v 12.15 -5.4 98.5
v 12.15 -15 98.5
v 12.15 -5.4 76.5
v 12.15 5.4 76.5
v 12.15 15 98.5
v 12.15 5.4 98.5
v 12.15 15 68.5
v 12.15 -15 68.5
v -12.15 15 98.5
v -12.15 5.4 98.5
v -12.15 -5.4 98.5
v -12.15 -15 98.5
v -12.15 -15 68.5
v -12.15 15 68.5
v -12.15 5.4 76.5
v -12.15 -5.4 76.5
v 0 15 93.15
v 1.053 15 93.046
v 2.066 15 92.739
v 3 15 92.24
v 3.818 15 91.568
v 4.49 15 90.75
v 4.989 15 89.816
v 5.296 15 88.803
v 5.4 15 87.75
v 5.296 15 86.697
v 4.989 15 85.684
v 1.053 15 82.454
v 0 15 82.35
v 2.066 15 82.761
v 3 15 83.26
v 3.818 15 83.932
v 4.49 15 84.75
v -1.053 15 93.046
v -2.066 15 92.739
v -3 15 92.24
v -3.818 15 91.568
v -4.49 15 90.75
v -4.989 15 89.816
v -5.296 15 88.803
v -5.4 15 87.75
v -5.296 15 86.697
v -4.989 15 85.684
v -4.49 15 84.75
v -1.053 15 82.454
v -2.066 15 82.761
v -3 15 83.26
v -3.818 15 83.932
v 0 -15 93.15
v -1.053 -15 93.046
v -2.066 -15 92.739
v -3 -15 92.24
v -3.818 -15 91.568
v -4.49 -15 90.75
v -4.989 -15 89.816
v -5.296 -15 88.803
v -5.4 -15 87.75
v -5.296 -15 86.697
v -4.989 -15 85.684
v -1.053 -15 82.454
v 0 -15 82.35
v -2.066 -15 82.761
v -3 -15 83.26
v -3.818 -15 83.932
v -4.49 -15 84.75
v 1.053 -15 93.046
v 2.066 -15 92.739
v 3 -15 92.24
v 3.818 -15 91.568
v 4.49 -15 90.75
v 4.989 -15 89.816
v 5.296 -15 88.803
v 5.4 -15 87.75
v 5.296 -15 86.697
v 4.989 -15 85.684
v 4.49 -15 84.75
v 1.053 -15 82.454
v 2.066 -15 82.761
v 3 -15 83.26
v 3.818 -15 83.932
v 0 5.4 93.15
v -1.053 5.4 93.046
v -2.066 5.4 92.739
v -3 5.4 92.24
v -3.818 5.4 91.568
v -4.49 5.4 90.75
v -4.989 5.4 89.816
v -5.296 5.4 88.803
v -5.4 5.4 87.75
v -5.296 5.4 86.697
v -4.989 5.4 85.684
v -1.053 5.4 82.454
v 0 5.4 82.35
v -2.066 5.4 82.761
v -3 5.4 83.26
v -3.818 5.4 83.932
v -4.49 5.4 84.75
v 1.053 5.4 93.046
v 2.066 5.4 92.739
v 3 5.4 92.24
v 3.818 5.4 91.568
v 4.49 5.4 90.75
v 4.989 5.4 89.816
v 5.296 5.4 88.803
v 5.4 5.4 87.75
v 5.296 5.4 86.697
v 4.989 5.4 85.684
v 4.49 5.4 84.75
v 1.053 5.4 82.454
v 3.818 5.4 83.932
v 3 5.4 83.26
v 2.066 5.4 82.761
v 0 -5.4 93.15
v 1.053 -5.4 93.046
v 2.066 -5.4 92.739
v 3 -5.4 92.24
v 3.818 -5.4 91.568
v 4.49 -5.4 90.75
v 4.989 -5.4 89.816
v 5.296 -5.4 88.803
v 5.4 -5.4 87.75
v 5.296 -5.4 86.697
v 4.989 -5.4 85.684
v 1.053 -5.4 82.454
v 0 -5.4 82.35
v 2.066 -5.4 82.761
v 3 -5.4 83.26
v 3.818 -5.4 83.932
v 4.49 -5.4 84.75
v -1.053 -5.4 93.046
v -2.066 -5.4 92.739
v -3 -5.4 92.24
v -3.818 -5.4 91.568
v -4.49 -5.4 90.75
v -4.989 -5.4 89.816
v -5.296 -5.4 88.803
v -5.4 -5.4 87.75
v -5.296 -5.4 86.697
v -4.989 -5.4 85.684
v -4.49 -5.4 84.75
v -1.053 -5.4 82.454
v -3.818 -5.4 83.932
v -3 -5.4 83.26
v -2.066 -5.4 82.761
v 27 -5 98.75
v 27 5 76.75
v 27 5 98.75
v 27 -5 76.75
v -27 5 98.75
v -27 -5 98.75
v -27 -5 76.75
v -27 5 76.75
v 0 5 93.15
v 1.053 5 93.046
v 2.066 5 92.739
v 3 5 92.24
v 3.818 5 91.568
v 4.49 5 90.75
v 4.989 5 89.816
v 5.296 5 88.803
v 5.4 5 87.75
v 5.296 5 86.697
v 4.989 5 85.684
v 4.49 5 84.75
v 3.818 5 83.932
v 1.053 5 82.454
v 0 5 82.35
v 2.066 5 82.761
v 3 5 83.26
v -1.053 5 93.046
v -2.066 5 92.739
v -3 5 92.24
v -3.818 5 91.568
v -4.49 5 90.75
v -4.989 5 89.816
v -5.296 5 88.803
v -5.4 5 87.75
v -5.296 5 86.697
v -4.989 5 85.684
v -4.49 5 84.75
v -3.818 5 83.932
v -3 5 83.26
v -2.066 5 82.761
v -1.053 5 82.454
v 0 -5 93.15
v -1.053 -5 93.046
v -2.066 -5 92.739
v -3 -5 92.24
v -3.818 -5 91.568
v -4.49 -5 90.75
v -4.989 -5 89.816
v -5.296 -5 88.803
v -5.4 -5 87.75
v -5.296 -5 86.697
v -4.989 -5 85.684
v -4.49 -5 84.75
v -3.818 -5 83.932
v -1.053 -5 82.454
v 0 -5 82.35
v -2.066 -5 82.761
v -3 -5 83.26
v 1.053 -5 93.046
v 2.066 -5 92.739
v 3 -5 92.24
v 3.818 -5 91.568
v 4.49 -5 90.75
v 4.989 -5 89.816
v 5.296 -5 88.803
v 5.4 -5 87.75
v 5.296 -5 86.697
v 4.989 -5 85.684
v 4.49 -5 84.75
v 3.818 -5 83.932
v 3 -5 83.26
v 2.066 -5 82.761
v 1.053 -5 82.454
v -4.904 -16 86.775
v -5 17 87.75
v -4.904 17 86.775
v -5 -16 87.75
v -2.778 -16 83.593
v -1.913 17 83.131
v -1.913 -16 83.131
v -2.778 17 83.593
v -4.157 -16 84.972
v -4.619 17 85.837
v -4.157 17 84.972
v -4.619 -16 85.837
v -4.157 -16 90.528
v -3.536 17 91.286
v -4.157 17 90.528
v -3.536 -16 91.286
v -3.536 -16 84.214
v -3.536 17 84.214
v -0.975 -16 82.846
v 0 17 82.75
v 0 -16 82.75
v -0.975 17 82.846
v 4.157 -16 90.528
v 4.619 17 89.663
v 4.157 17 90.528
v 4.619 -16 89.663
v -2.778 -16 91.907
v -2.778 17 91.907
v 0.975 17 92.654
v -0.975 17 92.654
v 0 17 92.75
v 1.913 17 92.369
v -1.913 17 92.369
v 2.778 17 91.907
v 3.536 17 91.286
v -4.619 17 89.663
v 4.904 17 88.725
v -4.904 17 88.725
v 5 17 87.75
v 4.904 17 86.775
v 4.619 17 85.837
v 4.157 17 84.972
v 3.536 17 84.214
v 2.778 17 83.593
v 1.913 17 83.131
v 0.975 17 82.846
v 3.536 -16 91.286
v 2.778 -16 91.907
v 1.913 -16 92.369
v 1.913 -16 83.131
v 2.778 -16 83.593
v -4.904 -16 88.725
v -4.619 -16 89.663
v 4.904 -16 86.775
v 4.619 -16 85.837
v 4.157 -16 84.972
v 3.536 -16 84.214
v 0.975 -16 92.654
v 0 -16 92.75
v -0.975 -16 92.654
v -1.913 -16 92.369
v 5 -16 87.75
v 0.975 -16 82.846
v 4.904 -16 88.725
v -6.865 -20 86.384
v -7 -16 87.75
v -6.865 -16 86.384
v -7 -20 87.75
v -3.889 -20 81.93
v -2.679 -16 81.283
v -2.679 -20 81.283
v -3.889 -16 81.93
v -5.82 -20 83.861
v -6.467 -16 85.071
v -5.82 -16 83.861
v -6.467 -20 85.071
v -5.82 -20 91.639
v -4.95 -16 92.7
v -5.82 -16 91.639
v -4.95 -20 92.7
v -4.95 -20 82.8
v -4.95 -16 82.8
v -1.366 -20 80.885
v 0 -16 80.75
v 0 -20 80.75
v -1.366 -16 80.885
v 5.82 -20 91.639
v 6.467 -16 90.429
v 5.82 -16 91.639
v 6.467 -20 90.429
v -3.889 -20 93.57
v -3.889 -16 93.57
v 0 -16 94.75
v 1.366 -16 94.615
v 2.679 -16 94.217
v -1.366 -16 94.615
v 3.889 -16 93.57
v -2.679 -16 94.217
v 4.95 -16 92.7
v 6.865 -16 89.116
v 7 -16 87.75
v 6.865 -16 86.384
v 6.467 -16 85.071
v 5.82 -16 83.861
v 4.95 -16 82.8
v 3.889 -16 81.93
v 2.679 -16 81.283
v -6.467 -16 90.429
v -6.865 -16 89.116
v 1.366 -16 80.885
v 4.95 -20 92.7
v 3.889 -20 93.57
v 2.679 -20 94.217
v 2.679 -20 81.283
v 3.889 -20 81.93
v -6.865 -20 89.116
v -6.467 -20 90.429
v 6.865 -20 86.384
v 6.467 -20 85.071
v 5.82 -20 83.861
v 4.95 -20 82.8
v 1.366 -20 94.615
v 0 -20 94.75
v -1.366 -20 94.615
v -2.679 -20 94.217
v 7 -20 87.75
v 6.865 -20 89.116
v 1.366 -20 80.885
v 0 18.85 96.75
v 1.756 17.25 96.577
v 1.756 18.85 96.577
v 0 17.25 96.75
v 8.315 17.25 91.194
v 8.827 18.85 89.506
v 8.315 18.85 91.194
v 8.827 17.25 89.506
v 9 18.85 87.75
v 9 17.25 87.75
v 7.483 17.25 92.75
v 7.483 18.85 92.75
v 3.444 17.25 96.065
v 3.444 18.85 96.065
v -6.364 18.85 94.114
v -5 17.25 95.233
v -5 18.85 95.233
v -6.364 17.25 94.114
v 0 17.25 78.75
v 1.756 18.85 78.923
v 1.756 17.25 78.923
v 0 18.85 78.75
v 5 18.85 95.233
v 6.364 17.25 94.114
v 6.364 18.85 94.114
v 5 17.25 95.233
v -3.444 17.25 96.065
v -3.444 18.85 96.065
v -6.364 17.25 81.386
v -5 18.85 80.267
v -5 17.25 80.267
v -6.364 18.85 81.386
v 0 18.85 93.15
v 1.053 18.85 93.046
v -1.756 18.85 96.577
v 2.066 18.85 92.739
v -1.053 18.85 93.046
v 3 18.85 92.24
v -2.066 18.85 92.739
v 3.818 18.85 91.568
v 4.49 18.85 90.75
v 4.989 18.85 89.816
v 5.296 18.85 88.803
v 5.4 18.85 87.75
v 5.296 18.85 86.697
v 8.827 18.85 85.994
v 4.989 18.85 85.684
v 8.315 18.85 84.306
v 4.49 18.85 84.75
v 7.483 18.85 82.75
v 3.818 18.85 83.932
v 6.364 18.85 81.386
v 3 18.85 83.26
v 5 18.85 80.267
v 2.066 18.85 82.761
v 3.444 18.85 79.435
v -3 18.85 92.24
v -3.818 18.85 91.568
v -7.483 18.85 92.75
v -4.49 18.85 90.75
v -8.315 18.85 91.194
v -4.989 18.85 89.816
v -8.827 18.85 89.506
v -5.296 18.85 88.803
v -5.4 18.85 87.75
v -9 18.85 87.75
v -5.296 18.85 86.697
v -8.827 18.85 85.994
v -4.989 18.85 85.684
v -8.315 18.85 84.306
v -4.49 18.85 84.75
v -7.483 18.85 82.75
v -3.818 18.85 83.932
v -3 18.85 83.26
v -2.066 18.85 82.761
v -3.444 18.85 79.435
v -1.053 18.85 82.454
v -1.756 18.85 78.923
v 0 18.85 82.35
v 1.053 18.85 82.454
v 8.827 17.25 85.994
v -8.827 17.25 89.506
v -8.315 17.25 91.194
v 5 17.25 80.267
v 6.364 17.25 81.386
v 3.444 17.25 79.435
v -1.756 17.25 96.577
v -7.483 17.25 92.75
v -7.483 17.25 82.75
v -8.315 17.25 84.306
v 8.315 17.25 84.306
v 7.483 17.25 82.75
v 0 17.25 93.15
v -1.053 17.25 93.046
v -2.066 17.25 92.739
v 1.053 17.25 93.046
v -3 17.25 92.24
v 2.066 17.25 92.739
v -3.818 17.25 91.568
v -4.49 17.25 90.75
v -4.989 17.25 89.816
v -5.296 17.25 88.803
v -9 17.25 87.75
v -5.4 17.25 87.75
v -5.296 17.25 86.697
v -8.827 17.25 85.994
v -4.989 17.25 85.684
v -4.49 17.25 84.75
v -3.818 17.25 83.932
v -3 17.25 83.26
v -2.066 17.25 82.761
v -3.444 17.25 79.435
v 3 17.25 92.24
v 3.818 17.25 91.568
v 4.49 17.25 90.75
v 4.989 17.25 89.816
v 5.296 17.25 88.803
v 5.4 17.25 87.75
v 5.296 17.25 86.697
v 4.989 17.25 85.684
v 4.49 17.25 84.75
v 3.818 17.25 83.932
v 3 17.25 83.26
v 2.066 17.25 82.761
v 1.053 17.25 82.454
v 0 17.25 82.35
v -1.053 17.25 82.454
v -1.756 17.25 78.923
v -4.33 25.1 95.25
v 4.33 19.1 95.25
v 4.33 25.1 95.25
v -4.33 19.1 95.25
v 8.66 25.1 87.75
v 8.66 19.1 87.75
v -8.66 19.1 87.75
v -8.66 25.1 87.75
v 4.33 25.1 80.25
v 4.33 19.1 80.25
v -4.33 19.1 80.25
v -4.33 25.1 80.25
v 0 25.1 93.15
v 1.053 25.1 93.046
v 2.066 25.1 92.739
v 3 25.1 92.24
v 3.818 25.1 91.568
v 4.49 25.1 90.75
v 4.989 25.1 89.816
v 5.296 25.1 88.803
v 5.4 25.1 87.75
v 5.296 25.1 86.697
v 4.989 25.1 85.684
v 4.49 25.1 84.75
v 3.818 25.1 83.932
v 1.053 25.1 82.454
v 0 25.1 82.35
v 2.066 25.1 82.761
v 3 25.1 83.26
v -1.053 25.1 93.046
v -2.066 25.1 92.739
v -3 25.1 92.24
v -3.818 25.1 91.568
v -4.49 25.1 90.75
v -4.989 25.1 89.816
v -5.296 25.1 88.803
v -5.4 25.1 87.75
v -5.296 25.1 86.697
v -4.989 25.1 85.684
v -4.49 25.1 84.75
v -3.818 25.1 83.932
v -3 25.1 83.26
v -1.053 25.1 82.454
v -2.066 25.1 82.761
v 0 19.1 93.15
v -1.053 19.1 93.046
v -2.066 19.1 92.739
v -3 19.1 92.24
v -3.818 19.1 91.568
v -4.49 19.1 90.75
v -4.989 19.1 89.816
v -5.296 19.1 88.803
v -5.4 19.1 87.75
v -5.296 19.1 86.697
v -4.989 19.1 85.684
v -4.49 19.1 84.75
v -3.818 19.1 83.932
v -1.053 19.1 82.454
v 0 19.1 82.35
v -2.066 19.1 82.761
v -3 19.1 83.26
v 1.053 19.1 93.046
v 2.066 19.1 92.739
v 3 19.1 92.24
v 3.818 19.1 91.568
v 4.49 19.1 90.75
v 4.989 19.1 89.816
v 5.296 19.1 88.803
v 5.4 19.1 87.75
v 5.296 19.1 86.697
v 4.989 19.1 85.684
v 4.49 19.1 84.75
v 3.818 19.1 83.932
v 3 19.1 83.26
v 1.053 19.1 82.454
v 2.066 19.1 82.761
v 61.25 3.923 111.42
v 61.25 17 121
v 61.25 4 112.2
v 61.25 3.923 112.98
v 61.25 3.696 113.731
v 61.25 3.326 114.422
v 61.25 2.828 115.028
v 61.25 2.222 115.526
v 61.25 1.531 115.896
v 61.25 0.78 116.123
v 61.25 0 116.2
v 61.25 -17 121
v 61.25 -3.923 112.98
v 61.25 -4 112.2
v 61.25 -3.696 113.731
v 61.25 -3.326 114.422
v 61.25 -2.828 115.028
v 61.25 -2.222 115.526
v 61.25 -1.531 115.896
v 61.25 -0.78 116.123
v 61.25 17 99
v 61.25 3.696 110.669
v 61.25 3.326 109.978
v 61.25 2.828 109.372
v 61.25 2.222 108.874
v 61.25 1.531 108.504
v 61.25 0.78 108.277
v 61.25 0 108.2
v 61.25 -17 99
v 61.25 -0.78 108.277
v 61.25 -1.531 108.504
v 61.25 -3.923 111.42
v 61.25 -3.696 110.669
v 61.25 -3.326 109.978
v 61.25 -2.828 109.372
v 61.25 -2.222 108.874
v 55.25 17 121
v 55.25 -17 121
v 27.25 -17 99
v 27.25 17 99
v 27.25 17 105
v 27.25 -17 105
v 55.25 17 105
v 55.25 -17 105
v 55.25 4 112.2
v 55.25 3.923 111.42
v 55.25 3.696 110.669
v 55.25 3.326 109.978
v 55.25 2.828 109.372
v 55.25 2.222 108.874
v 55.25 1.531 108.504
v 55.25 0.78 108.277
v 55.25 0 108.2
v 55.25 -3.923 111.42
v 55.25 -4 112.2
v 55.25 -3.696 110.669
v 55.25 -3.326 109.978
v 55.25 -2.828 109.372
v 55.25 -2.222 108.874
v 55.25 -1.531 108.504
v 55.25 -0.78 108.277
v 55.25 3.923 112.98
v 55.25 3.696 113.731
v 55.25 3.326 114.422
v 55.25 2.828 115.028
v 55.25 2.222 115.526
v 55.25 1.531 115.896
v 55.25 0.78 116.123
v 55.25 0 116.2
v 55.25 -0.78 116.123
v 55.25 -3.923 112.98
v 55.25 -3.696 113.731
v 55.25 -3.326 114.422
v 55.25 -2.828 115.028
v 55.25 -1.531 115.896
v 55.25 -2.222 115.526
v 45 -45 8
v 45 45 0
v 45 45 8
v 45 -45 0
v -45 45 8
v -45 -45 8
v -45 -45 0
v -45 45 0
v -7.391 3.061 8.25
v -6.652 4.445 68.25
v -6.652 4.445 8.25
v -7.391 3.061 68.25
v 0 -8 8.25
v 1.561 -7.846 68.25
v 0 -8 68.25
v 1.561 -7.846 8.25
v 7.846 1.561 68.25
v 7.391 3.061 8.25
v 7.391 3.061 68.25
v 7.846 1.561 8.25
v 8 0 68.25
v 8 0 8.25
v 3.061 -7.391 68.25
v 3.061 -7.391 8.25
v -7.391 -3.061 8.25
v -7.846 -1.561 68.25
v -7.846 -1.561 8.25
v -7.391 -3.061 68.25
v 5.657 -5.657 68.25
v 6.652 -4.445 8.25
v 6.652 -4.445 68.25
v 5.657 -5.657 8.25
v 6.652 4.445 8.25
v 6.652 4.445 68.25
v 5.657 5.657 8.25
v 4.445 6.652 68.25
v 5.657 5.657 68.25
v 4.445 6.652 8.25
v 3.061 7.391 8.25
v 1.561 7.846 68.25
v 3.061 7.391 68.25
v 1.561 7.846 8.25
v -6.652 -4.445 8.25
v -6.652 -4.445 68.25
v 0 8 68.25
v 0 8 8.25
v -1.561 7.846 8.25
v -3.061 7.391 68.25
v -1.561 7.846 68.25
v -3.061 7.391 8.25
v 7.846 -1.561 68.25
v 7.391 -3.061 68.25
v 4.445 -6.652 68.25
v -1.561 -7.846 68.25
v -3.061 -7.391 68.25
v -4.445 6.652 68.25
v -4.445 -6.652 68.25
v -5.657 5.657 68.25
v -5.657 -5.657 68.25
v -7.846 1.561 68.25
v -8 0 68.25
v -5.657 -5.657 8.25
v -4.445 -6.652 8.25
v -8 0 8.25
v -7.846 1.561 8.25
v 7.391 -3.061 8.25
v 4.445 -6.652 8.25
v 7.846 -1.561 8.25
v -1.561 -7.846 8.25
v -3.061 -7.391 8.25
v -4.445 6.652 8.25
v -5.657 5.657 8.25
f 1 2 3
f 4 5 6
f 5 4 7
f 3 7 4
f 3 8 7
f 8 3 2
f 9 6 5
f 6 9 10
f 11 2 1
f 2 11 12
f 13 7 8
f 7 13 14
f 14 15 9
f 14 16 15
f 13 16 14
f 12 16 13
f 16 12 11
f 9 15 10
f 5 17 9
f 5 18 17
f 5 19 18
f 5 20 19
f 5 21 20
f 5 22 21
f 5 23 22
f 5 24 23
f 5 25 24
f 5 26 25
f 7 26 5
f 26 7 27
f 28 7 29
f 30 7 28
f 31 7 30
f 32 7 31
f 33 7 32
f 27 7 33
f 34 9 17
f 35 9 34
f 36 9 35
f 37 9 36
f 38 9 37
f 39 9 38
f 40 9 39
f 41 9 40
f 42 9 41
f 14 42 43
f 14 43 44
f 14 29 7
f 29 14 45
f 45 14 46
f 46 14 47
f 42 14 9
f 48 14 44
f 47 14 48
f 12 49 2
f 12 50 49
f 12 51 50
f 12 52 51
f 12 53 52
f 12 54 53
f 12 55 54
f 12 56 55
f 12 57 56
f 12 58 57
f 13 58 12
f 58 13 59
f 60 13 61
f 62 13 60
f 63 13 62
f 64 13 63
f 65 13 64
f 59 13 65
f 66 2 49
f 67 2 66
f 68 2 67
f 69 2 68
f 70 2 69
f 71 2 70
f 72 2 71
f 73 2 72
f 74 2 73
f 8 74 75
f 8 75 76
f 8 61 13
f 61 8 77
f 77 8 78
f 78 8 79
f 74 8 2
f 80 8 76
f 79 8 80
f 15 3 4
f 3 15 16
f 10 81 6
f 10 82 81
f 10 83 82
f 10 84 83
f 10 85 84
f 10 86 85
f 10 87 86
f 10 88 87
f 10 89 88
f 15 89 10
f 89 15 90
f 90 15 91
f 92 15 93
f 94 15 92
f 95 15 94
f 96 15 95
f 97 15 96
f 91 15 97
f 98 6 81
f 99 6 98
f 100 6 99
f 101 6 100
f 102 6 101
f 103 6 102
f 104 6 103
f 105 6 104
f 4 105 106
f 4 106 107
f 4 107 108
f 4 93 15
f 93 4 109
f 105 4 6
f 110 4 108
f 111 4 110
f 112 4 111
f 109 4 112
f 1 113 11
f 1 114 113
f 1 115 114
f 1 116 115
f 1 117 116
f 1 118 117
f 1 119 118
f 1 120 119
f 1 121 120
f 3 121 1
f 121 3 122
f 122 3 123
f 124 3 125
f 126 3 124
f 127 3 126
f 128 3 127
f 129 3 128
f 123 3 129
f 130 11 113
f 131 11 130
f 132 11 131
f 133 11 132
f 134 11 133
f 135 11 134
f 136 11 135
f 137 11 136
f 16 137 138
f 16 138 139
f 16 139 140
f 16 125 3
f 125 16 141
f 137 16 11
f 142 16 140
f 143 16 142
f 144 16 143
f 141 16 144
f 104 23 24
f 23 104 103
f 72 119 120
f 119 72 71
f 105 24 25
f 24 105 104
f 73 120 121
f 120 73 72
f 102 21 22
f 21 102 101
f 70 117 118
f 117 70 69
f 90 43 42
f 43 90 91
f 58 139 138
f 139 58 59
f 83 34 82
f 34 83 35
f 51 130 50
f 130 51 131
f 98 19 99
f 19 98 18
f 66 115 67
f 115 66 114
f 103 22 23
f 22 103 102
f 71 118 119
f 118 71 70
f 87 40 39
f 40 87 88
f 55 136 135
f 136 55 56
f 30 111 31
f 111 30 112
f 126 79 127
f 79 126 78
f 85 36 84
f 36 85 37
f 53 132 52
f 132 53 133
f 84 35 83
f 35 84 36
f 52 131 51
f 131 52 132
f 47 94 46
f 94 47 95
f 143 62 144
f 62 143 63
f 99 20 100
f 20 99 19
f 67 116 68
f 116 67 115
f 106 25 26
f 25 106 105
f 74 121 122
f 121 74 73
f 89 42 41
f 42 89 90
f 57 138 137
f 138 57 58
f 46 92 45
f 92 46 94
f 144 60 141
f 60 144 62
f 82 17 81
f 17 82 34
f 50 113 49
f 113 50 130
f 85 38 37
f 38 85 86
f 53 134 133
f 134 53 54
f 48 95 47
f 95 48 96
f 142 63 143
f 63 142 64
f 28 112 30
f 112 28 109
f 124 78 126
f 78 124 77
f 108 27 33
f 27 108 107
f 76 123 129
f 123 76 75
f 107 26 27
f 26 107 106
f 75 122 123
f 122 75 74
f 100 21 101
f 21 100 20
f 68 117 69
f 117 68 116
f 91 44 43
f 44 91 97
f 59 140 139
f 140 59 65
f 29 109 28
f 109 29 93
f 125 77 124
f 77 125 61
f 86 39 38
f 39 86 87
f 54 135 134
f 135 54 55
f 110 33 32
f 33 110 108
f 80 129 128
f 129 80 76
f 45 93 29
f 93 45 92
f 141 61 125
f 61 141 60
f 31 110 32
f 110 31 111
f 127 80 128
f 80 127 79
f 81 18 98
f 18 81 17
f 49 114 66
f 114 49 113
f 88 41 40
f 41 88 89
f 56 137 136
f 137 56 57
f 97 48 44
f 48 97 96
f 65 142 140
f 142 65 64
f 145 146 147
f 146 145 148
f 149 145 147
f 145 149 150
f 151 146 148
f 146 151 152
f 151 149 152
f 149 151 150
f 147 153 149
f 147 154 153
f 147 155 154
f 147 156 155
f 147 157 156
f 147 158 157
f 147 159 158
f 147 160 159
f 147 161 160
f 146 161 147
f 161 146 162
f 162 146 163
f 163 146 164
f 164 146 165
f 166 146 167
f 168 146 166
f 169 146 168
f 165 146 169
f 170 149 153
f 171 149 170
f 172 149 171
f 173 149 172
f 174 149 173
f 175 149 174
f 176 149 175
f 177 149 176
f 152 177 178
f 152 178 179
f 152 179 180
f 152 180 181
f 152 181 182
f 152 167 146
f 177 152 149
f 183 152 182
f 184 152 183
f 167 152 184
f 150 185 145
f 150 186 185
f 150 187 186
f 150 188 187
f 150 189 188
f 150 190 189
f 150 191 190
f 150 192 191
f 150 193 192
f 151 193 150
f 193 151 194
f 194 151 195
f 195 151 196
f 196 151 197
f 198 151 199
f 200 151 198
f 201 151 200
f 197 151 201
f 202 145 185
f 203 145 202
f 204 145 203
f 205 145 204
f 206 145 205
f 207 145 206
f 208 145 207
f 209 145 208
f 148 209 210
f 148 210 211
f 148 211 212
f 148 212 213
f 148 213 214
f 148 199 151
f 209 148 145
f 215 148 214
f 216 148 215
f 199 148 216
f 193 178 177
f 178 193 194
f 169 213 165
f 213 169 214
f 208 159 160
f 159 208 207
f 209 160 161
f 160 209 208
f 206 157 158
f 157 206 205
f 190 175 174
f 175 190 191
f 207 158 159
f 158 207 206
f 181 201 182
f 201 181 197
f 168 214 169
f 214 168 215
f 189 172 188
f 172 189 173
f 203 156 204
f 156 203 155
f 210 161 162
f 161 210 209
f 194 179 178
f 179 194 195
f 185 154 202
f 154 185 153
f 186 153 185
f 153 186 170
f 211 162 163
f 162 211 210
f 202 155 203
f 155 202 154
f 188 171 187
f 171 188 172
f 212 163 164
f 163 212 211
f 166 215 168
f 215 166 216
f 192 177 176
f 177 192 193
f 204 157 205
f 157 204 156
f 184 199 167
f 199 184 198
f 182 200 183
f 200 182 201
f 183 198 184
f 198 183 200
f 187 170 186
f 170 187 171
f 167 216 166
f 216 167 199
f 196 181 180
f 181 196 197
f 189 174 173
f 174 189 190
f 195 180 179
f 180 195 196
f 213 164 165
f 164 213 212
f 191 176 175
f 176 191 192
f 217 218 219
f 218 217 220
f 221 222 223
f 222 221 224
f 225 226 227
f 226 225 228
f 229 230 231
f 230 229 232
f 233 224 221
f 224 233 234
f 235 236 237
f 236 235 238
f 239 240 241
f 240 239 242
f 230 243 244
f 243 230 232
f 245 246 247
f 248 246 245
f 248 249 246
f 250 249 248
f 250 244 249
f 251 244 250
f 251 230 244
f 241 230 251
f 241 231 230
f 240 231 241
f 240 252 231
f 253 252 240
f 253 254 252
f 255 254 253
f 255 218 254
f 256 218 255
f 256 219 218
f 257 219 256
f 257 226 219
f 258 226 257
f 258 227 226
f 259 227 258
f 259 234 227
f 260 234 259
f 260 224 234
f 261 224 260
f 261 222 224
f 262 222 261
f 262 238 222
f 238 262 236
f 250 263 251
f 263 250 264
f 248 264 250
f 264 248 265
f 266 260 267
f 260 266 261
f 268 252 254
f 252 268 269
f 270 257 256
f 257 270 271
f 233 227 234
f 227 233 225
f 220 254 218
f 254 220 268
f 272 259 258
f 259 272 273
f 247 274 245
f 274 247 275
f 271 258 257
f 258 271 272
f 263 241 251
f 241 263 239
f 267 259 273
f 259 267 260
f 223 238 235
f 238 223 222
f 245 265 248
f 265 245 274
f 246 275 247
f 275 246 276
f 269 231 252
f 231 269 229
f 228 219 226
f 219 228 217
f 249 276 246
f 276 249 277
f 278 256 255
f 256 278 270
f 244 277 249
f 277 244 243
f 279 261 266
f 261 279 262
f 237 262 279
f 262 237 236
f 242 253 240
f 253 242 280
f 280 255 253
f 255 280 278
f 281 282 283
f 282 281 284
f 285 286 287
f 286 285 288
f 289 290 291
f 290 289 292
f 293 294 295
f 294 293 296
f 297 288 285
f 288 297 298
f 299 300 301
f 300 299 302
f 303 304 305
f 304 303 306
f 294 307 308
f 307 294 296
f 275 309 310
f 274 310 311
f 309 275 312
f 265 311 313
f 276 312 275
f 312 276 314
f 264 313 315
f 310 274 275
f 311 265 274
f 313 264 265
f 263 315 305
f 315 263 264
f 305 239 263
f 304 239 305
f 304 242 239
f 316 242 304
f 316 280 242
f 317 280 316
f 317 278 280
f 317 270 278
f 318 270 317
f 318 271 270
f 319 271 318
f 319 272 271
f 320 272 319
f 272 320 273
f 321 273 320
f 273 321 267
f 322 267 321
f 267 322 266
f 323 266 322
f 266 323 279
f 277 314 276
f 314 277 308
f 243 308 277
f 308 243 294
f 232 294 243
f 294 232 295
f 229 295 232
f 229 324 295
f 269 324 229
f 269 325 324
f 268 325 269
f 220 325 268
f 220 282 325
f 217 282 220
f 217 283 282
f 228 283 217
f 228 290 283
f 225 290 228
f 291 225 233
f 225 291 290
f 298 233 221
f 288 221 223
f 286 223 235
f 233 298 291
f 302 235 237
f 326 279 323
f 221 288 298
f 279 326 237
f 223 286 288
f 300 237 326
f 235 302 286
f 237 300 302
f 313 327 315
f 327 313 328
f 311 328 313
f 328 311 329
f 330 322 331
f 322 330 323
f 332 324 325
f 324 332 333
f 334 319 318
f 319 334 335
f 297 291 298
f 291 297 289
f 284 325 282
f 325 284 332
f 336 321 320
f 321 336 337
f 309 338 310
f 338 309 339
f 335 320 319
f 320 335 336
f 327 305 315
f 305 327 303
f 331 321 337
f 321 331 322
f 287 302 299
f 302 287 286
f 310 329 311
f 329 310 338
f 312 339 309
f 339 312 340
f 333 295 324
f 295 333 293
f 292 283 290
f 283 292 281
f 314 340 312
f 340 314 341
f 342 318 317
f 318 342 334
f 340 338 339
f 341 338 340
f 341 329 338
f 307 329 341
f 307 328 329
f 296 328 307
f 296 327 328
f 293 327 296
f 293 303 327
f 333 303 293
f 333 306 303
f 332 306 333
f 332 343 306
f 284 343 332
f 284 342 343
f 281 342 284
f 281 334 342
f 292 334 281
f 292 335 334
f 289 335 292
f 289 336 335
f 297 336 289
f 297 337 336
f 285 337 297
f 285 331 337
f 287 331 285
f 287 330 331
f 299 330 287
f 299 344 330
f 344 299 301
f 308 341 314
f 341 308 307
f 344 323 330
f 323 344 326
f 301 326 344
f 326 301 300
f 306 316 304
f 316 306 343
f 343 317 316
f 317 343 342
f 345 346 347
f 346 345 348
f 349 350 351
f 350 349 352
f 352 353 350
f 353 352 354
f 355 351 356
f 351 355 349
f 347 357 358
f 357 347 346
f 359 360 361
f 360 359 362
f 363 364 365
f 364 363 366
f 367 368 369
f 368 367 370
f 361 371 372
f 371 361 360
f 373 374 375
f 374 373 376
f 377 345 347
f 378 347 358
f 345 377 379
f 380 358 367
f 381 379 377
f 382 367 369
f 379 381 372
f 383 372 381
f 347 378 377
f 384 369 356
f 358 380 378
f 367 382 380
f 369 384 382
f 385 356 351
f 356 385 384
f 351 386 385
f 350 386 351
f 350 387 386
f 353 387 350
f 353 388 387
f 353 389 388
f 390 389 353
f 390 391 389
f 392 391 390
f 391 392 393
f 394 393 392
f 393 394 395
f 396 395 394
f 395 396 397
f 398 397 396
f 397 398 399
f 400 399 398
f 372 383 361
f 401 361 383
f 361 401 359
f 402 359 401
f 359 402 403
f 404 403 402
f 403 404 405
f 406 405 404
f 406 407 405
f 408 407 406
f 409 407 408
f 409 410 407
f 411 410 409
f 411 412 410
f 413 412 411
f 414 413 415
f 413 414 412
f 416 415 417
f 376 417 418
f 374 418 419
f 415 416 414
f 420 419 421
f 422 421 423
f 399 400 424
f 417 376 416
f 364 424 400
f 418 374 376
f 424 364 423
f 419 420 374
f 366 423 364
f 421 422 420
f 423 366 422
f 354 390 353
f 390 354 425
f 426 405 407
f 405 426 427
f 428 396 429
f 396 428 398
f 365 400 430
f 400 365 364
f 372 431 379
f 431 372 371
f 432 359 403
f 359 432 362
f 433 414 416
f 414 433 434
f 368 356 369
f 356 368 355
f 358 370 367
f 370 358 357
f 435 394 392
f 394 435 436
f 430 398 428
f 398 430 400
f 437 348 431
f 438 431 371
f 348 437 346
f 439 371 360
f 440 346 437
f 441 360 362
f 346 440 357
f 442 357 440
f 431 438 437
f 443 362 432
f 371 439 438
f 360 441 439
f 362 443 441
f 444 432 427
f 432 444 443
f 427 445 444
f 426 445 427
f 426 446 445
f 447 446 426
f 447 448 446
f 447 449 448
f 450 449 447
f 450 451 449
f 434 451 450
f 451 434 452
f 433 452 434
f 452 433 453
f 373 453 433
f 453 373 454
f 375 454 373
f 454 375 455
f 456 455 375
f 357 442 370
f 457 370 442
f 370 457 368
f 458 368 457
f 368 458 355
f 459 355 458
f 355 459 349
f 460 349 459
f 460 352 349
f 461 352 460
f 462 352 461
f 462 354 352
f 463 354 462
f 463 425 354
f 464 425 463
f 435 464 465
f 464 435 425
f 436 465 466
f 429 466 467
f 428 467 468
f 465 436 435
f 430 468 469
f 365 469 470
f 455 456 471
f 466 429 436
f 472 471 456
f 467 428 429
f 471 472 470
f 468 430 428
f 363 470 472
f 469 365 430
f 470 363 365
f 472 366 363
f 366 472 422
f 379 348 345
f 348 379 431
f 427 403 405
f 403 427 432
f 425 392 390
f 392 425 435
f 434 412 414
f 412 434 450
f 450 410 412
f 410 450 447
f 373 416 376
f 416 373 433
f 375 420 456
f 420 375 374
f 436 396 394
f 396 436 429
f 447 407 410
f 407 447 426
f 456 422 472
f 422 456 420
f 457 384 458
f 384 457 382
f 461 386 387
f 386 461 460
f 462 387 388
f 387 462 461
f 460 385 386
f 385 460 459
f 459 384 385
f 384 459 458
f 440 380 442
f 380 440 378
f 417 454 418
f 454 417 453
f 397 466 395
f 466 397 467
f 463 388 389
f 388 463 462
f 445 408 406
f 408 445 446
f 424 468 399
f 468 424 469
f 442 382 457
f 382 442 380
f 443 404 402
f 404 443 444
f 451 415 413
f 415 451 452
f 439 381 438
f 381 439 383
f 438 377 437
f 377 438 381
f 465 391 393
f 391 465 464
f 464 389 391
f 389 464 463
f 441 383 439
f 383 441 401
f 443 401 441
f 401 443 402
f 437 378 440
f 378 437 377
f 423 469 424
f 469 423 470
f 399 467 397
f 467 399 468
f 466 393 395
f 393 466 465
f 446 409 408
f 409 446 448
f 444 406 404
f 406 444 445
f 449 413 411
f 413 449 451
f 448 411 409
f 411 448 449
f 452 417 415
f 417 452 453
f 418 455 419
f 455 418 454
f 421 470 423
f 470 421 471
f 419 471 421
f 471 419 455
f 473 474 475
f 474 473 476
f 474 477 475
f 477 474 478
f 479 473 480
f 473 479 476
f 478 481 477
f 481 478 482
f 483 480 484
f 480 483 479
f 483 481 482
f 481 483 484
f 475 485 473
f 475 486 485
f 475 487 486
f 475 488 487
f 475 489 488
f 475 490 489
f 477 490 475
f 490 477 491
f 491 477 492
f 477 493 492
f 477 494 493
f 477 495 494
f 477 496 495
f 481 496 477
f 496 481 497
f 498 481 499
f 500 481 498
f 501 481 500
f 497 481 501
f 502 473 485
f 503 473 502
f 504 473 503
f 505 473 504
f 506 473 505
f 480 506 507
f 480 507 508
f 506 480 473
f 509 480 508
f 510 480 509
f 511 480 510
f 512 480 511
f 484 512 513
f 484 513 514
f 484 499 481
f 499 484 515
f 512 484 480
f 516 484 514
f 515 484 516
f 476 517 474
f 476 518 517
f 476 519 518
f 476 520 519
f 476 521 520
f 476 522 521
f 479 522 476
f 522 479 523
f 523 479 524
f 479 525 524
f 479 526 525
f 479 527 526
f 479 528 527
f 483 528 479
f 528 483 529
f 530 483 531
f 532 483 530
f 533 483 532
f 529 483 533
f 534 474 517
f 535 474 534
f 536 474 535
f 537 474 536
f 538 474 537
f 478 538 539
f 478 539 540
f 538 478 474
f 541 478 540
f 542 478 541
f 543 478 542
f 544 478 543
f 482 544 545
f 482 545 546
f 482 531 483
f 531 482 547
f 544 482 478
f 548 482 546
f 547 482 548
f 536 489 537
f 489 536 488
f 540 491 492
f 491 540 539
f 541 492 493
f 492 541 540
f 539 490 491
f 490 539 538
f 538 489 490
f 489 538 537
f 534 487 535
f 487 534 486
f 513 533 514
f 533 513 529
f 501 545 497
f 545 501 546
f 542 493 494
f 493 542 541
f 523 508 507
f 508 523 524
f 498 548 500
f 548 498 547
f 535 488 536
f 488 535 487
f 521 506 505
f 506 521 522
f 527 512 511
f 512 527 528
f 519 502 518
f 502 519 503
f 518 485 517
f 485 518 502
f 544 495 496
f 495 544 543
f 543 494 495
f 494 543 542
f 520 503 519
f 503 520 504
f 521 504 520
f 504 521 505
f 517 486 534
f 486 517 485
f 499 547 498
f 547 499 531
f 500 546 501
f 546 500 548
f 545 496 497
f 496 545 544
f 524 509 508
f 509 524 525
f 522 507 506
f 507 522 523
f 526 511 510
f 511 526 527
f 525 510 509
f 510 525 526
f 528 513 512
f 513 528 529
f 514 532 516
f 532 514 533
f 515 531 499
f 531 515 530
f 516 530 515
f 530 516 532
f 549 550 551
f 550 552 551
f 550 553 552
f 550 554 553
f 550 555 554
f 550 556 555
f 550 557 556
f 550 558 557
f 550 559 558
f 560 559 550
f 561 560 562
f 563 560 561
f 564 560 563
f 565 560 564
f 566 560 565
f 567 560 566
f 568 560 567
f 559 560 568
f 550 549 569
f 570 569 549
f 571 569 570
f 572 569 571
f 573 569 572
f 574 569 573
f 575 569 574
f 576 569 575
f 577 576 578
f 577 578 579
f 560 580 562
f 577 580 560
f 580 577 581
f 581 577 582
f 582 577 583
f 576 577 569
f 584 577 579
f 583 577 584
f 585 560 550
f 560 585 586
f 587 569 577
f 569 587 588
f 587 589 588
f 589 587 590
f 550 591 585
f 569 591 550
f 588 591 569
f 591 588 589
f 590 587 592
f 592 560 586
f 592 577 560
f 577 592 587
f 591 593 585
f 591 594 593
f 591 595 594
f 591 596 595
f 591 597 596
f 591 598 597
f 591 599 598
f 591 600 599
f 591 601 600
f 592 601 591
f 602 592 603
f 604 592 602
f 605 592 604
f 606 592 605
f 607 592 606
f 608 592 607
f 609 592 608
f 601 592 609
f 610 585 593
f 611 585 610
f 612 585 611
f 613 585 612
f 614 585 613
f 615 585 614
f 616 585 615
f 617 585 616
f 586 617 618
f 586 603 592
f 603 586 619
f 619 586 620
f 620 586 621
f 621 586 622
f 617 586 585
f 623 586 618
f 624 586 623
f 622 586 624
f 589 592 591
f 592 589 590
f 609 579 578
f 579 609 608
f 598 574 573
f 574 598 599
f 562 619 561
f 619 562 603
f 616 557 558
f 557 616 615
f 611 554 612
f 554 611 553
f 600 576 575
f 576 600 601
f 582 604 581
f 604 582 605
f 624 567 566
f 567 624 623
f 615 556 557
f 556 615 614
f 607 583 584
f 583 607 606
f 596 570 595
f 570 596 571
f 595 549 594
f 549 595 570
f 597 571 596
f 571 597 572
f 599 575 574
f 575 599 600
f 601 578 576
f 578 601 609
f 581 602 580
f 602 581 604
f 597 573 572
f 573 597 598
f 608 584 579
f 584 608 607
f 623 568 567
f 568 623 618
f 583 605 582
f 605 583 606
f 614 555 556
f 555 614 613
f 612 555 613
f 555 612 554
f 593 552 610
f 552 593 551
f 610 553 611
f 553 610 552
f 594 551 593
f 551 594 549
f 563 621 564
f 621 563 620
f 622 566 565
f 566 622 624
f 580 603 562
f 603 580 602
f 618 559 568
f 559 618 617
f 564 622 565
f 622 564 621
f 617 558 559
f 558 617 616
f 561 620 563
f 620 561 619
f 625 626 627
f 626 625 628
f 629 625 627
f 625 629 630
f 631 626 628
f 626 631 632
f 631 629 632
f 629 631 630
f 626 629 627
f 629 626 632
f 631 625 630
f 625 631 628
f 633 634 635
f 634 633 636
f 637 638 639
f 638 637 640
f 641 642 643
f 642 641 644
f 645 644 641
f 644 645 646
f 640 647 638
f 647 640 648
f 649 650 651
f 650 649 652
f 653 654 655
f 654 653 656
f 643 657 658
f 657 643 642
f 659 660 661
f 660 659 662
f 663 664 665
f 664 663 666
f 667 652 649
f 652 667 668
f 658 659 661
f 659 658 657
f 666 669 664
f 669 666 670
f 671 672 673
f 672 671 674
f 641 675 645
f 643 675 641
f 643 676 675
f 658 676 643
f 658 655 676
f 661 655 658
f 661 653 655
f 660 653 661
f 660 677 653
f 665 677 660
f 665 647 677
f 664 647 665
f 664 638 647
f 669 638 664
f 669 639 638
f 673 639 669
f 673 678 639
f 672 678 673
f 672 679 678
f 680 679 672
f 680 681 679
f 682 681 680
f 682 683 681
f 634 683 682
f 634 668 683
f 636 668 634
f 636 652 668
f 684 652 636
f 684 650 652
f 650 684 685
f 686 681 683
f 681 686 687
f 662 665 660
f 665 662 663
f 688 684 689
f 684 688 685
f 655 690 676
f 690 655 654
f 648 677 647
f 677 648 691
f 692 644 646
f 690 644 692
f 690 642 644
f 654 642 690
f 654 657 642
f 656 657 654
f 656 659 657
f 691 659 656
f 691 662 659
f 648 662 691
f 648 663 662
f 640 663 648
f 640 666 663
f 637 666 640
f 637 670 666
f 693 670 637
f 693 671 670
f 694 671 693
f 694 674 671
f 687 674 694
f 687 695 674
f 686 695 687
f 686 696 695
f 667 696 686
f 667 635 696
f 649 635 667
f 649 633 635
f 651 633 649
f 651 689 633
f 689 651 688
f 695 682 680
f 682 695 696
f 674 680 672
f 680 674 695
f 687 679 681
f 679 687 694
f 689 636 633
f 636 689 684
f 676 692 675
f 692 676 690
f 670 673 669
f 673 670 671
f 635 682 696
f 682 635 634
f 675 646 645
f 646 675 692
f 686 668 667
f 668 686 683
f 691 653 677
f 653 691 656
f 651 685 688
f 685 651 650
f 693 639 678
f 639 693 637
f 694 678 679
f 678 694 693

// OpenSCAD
$fn = 32;

// ------------------------------------------------------------------------
// Lamp arm: column d16 x 60 mm, arm 54 mm
// Every part is its own module, assembly() places every instance.
// ------------------------------------------------------------------------

// --- part 1 ---
module lamp_base() {
  difference() {
    translate([-45, -45, 0]) cube([90, 90, 8]);
  }
}

// --- part 2 ---
module lamp_column() {
  cylinder(h = 60, d = 16);
}

// --- part 3 ---
module head_fork() {
  difference() {
    translate([-12.15, -15, 0]) cube([24.3, 30, 30]);
    translate([-13.15, -5.4, 8]) cube([26.3, 10.8, 23]);
    translate([0, 0, 19.25]) rotate([90, 0, 0]) cylinder(h = 32, d = 10.8, center = true);
  }
}

// --- part 4 ---
module lamp_arm() {
  difference() {
    translate([-27, -5, 0]) cube([54, 10, 22]);
    translate([0, 0, 11]) rotate([90, 0, 0]) cylinder(h = 12, d = 10.8, center = true);
  }
}

// --- part 5 ---
module arm_pin() {
  rotate([0, 90, 0]) cylinder(h = 34, d = 10, center = true);
  translate([-20, 0, 0]) rotate([0, 90, 0]) cylinder(h = 4, d = 14);
}

// --- part 6 ---
module arm_washer() {
  difference() {
      translate([0, 0, 0]) cylinder(h = 1.6, d = 18);
      translate([0, 0, -1]) cylinder(h = 3.6, d = 10.8);
    }
}

// --- part 7 ---
module arm_nut() {
  difference() {
    linear_extrude(height = 6) polygon(points = [[8.66, 0], [4.33, 7.5], [-4.33, 7.5], [-8.66, 0], [-4.33, -7.5], [4.33, -7.5]]);
    translate([0, 0, -1]) cylinder(h = 8, d = 10.8);
  }
}

// --- part 8 ---
module shade_bracket() {
  difference() {
    translate([-17, -17, 0]) cube([34, 34, 22]);
    translate([-18, -18, 6]) cube([29, 36, 17]);
    translate([14, 0, 13.2]) rotate([0, 90, 0]) cylinder(h = 8, d = 8, center = true);
  }
}

// --- assembly ---
module assembly() {
  color([0.80, 0.24, 0.20]) translate([0, 0, 0]) rotate([0, 0, 0]) lamp_base();
  color([0.20, 0.45, 0.75]) translate([0, 0, 8.25]) rotate([0, 0, 0]) lamp_column();
  color([0.25, 0.62, 0.32]) translate([0, 0, 68.5]) rotate([0, 0, 0]) head_fork();
  color([0.92, 0.70, 0.18]) translate([0, 0, 76.75]) rotate([0, 0, 0]) lamp_arm();
  color([0.58, 0.35, 0.70]) translate([0, 0, 87.75]) rotate([0, 0, 90]) arm_pin();
  color([0.16, 0.66, 0.66]) translate([0, 18.85, 87.75]) rotate([90, 0, 0]) arm_washer();
  color([0.85, 0.48, 0.18]) translate([0, 25.1, 87.75]) rotate([90, 0, 0]) arm_nut();
  color([0.55, 0.60, 0.65]) translate([44.25, 0, 99]) rotate([0, 0, 0]) shade_bracket();
}

assembly();
